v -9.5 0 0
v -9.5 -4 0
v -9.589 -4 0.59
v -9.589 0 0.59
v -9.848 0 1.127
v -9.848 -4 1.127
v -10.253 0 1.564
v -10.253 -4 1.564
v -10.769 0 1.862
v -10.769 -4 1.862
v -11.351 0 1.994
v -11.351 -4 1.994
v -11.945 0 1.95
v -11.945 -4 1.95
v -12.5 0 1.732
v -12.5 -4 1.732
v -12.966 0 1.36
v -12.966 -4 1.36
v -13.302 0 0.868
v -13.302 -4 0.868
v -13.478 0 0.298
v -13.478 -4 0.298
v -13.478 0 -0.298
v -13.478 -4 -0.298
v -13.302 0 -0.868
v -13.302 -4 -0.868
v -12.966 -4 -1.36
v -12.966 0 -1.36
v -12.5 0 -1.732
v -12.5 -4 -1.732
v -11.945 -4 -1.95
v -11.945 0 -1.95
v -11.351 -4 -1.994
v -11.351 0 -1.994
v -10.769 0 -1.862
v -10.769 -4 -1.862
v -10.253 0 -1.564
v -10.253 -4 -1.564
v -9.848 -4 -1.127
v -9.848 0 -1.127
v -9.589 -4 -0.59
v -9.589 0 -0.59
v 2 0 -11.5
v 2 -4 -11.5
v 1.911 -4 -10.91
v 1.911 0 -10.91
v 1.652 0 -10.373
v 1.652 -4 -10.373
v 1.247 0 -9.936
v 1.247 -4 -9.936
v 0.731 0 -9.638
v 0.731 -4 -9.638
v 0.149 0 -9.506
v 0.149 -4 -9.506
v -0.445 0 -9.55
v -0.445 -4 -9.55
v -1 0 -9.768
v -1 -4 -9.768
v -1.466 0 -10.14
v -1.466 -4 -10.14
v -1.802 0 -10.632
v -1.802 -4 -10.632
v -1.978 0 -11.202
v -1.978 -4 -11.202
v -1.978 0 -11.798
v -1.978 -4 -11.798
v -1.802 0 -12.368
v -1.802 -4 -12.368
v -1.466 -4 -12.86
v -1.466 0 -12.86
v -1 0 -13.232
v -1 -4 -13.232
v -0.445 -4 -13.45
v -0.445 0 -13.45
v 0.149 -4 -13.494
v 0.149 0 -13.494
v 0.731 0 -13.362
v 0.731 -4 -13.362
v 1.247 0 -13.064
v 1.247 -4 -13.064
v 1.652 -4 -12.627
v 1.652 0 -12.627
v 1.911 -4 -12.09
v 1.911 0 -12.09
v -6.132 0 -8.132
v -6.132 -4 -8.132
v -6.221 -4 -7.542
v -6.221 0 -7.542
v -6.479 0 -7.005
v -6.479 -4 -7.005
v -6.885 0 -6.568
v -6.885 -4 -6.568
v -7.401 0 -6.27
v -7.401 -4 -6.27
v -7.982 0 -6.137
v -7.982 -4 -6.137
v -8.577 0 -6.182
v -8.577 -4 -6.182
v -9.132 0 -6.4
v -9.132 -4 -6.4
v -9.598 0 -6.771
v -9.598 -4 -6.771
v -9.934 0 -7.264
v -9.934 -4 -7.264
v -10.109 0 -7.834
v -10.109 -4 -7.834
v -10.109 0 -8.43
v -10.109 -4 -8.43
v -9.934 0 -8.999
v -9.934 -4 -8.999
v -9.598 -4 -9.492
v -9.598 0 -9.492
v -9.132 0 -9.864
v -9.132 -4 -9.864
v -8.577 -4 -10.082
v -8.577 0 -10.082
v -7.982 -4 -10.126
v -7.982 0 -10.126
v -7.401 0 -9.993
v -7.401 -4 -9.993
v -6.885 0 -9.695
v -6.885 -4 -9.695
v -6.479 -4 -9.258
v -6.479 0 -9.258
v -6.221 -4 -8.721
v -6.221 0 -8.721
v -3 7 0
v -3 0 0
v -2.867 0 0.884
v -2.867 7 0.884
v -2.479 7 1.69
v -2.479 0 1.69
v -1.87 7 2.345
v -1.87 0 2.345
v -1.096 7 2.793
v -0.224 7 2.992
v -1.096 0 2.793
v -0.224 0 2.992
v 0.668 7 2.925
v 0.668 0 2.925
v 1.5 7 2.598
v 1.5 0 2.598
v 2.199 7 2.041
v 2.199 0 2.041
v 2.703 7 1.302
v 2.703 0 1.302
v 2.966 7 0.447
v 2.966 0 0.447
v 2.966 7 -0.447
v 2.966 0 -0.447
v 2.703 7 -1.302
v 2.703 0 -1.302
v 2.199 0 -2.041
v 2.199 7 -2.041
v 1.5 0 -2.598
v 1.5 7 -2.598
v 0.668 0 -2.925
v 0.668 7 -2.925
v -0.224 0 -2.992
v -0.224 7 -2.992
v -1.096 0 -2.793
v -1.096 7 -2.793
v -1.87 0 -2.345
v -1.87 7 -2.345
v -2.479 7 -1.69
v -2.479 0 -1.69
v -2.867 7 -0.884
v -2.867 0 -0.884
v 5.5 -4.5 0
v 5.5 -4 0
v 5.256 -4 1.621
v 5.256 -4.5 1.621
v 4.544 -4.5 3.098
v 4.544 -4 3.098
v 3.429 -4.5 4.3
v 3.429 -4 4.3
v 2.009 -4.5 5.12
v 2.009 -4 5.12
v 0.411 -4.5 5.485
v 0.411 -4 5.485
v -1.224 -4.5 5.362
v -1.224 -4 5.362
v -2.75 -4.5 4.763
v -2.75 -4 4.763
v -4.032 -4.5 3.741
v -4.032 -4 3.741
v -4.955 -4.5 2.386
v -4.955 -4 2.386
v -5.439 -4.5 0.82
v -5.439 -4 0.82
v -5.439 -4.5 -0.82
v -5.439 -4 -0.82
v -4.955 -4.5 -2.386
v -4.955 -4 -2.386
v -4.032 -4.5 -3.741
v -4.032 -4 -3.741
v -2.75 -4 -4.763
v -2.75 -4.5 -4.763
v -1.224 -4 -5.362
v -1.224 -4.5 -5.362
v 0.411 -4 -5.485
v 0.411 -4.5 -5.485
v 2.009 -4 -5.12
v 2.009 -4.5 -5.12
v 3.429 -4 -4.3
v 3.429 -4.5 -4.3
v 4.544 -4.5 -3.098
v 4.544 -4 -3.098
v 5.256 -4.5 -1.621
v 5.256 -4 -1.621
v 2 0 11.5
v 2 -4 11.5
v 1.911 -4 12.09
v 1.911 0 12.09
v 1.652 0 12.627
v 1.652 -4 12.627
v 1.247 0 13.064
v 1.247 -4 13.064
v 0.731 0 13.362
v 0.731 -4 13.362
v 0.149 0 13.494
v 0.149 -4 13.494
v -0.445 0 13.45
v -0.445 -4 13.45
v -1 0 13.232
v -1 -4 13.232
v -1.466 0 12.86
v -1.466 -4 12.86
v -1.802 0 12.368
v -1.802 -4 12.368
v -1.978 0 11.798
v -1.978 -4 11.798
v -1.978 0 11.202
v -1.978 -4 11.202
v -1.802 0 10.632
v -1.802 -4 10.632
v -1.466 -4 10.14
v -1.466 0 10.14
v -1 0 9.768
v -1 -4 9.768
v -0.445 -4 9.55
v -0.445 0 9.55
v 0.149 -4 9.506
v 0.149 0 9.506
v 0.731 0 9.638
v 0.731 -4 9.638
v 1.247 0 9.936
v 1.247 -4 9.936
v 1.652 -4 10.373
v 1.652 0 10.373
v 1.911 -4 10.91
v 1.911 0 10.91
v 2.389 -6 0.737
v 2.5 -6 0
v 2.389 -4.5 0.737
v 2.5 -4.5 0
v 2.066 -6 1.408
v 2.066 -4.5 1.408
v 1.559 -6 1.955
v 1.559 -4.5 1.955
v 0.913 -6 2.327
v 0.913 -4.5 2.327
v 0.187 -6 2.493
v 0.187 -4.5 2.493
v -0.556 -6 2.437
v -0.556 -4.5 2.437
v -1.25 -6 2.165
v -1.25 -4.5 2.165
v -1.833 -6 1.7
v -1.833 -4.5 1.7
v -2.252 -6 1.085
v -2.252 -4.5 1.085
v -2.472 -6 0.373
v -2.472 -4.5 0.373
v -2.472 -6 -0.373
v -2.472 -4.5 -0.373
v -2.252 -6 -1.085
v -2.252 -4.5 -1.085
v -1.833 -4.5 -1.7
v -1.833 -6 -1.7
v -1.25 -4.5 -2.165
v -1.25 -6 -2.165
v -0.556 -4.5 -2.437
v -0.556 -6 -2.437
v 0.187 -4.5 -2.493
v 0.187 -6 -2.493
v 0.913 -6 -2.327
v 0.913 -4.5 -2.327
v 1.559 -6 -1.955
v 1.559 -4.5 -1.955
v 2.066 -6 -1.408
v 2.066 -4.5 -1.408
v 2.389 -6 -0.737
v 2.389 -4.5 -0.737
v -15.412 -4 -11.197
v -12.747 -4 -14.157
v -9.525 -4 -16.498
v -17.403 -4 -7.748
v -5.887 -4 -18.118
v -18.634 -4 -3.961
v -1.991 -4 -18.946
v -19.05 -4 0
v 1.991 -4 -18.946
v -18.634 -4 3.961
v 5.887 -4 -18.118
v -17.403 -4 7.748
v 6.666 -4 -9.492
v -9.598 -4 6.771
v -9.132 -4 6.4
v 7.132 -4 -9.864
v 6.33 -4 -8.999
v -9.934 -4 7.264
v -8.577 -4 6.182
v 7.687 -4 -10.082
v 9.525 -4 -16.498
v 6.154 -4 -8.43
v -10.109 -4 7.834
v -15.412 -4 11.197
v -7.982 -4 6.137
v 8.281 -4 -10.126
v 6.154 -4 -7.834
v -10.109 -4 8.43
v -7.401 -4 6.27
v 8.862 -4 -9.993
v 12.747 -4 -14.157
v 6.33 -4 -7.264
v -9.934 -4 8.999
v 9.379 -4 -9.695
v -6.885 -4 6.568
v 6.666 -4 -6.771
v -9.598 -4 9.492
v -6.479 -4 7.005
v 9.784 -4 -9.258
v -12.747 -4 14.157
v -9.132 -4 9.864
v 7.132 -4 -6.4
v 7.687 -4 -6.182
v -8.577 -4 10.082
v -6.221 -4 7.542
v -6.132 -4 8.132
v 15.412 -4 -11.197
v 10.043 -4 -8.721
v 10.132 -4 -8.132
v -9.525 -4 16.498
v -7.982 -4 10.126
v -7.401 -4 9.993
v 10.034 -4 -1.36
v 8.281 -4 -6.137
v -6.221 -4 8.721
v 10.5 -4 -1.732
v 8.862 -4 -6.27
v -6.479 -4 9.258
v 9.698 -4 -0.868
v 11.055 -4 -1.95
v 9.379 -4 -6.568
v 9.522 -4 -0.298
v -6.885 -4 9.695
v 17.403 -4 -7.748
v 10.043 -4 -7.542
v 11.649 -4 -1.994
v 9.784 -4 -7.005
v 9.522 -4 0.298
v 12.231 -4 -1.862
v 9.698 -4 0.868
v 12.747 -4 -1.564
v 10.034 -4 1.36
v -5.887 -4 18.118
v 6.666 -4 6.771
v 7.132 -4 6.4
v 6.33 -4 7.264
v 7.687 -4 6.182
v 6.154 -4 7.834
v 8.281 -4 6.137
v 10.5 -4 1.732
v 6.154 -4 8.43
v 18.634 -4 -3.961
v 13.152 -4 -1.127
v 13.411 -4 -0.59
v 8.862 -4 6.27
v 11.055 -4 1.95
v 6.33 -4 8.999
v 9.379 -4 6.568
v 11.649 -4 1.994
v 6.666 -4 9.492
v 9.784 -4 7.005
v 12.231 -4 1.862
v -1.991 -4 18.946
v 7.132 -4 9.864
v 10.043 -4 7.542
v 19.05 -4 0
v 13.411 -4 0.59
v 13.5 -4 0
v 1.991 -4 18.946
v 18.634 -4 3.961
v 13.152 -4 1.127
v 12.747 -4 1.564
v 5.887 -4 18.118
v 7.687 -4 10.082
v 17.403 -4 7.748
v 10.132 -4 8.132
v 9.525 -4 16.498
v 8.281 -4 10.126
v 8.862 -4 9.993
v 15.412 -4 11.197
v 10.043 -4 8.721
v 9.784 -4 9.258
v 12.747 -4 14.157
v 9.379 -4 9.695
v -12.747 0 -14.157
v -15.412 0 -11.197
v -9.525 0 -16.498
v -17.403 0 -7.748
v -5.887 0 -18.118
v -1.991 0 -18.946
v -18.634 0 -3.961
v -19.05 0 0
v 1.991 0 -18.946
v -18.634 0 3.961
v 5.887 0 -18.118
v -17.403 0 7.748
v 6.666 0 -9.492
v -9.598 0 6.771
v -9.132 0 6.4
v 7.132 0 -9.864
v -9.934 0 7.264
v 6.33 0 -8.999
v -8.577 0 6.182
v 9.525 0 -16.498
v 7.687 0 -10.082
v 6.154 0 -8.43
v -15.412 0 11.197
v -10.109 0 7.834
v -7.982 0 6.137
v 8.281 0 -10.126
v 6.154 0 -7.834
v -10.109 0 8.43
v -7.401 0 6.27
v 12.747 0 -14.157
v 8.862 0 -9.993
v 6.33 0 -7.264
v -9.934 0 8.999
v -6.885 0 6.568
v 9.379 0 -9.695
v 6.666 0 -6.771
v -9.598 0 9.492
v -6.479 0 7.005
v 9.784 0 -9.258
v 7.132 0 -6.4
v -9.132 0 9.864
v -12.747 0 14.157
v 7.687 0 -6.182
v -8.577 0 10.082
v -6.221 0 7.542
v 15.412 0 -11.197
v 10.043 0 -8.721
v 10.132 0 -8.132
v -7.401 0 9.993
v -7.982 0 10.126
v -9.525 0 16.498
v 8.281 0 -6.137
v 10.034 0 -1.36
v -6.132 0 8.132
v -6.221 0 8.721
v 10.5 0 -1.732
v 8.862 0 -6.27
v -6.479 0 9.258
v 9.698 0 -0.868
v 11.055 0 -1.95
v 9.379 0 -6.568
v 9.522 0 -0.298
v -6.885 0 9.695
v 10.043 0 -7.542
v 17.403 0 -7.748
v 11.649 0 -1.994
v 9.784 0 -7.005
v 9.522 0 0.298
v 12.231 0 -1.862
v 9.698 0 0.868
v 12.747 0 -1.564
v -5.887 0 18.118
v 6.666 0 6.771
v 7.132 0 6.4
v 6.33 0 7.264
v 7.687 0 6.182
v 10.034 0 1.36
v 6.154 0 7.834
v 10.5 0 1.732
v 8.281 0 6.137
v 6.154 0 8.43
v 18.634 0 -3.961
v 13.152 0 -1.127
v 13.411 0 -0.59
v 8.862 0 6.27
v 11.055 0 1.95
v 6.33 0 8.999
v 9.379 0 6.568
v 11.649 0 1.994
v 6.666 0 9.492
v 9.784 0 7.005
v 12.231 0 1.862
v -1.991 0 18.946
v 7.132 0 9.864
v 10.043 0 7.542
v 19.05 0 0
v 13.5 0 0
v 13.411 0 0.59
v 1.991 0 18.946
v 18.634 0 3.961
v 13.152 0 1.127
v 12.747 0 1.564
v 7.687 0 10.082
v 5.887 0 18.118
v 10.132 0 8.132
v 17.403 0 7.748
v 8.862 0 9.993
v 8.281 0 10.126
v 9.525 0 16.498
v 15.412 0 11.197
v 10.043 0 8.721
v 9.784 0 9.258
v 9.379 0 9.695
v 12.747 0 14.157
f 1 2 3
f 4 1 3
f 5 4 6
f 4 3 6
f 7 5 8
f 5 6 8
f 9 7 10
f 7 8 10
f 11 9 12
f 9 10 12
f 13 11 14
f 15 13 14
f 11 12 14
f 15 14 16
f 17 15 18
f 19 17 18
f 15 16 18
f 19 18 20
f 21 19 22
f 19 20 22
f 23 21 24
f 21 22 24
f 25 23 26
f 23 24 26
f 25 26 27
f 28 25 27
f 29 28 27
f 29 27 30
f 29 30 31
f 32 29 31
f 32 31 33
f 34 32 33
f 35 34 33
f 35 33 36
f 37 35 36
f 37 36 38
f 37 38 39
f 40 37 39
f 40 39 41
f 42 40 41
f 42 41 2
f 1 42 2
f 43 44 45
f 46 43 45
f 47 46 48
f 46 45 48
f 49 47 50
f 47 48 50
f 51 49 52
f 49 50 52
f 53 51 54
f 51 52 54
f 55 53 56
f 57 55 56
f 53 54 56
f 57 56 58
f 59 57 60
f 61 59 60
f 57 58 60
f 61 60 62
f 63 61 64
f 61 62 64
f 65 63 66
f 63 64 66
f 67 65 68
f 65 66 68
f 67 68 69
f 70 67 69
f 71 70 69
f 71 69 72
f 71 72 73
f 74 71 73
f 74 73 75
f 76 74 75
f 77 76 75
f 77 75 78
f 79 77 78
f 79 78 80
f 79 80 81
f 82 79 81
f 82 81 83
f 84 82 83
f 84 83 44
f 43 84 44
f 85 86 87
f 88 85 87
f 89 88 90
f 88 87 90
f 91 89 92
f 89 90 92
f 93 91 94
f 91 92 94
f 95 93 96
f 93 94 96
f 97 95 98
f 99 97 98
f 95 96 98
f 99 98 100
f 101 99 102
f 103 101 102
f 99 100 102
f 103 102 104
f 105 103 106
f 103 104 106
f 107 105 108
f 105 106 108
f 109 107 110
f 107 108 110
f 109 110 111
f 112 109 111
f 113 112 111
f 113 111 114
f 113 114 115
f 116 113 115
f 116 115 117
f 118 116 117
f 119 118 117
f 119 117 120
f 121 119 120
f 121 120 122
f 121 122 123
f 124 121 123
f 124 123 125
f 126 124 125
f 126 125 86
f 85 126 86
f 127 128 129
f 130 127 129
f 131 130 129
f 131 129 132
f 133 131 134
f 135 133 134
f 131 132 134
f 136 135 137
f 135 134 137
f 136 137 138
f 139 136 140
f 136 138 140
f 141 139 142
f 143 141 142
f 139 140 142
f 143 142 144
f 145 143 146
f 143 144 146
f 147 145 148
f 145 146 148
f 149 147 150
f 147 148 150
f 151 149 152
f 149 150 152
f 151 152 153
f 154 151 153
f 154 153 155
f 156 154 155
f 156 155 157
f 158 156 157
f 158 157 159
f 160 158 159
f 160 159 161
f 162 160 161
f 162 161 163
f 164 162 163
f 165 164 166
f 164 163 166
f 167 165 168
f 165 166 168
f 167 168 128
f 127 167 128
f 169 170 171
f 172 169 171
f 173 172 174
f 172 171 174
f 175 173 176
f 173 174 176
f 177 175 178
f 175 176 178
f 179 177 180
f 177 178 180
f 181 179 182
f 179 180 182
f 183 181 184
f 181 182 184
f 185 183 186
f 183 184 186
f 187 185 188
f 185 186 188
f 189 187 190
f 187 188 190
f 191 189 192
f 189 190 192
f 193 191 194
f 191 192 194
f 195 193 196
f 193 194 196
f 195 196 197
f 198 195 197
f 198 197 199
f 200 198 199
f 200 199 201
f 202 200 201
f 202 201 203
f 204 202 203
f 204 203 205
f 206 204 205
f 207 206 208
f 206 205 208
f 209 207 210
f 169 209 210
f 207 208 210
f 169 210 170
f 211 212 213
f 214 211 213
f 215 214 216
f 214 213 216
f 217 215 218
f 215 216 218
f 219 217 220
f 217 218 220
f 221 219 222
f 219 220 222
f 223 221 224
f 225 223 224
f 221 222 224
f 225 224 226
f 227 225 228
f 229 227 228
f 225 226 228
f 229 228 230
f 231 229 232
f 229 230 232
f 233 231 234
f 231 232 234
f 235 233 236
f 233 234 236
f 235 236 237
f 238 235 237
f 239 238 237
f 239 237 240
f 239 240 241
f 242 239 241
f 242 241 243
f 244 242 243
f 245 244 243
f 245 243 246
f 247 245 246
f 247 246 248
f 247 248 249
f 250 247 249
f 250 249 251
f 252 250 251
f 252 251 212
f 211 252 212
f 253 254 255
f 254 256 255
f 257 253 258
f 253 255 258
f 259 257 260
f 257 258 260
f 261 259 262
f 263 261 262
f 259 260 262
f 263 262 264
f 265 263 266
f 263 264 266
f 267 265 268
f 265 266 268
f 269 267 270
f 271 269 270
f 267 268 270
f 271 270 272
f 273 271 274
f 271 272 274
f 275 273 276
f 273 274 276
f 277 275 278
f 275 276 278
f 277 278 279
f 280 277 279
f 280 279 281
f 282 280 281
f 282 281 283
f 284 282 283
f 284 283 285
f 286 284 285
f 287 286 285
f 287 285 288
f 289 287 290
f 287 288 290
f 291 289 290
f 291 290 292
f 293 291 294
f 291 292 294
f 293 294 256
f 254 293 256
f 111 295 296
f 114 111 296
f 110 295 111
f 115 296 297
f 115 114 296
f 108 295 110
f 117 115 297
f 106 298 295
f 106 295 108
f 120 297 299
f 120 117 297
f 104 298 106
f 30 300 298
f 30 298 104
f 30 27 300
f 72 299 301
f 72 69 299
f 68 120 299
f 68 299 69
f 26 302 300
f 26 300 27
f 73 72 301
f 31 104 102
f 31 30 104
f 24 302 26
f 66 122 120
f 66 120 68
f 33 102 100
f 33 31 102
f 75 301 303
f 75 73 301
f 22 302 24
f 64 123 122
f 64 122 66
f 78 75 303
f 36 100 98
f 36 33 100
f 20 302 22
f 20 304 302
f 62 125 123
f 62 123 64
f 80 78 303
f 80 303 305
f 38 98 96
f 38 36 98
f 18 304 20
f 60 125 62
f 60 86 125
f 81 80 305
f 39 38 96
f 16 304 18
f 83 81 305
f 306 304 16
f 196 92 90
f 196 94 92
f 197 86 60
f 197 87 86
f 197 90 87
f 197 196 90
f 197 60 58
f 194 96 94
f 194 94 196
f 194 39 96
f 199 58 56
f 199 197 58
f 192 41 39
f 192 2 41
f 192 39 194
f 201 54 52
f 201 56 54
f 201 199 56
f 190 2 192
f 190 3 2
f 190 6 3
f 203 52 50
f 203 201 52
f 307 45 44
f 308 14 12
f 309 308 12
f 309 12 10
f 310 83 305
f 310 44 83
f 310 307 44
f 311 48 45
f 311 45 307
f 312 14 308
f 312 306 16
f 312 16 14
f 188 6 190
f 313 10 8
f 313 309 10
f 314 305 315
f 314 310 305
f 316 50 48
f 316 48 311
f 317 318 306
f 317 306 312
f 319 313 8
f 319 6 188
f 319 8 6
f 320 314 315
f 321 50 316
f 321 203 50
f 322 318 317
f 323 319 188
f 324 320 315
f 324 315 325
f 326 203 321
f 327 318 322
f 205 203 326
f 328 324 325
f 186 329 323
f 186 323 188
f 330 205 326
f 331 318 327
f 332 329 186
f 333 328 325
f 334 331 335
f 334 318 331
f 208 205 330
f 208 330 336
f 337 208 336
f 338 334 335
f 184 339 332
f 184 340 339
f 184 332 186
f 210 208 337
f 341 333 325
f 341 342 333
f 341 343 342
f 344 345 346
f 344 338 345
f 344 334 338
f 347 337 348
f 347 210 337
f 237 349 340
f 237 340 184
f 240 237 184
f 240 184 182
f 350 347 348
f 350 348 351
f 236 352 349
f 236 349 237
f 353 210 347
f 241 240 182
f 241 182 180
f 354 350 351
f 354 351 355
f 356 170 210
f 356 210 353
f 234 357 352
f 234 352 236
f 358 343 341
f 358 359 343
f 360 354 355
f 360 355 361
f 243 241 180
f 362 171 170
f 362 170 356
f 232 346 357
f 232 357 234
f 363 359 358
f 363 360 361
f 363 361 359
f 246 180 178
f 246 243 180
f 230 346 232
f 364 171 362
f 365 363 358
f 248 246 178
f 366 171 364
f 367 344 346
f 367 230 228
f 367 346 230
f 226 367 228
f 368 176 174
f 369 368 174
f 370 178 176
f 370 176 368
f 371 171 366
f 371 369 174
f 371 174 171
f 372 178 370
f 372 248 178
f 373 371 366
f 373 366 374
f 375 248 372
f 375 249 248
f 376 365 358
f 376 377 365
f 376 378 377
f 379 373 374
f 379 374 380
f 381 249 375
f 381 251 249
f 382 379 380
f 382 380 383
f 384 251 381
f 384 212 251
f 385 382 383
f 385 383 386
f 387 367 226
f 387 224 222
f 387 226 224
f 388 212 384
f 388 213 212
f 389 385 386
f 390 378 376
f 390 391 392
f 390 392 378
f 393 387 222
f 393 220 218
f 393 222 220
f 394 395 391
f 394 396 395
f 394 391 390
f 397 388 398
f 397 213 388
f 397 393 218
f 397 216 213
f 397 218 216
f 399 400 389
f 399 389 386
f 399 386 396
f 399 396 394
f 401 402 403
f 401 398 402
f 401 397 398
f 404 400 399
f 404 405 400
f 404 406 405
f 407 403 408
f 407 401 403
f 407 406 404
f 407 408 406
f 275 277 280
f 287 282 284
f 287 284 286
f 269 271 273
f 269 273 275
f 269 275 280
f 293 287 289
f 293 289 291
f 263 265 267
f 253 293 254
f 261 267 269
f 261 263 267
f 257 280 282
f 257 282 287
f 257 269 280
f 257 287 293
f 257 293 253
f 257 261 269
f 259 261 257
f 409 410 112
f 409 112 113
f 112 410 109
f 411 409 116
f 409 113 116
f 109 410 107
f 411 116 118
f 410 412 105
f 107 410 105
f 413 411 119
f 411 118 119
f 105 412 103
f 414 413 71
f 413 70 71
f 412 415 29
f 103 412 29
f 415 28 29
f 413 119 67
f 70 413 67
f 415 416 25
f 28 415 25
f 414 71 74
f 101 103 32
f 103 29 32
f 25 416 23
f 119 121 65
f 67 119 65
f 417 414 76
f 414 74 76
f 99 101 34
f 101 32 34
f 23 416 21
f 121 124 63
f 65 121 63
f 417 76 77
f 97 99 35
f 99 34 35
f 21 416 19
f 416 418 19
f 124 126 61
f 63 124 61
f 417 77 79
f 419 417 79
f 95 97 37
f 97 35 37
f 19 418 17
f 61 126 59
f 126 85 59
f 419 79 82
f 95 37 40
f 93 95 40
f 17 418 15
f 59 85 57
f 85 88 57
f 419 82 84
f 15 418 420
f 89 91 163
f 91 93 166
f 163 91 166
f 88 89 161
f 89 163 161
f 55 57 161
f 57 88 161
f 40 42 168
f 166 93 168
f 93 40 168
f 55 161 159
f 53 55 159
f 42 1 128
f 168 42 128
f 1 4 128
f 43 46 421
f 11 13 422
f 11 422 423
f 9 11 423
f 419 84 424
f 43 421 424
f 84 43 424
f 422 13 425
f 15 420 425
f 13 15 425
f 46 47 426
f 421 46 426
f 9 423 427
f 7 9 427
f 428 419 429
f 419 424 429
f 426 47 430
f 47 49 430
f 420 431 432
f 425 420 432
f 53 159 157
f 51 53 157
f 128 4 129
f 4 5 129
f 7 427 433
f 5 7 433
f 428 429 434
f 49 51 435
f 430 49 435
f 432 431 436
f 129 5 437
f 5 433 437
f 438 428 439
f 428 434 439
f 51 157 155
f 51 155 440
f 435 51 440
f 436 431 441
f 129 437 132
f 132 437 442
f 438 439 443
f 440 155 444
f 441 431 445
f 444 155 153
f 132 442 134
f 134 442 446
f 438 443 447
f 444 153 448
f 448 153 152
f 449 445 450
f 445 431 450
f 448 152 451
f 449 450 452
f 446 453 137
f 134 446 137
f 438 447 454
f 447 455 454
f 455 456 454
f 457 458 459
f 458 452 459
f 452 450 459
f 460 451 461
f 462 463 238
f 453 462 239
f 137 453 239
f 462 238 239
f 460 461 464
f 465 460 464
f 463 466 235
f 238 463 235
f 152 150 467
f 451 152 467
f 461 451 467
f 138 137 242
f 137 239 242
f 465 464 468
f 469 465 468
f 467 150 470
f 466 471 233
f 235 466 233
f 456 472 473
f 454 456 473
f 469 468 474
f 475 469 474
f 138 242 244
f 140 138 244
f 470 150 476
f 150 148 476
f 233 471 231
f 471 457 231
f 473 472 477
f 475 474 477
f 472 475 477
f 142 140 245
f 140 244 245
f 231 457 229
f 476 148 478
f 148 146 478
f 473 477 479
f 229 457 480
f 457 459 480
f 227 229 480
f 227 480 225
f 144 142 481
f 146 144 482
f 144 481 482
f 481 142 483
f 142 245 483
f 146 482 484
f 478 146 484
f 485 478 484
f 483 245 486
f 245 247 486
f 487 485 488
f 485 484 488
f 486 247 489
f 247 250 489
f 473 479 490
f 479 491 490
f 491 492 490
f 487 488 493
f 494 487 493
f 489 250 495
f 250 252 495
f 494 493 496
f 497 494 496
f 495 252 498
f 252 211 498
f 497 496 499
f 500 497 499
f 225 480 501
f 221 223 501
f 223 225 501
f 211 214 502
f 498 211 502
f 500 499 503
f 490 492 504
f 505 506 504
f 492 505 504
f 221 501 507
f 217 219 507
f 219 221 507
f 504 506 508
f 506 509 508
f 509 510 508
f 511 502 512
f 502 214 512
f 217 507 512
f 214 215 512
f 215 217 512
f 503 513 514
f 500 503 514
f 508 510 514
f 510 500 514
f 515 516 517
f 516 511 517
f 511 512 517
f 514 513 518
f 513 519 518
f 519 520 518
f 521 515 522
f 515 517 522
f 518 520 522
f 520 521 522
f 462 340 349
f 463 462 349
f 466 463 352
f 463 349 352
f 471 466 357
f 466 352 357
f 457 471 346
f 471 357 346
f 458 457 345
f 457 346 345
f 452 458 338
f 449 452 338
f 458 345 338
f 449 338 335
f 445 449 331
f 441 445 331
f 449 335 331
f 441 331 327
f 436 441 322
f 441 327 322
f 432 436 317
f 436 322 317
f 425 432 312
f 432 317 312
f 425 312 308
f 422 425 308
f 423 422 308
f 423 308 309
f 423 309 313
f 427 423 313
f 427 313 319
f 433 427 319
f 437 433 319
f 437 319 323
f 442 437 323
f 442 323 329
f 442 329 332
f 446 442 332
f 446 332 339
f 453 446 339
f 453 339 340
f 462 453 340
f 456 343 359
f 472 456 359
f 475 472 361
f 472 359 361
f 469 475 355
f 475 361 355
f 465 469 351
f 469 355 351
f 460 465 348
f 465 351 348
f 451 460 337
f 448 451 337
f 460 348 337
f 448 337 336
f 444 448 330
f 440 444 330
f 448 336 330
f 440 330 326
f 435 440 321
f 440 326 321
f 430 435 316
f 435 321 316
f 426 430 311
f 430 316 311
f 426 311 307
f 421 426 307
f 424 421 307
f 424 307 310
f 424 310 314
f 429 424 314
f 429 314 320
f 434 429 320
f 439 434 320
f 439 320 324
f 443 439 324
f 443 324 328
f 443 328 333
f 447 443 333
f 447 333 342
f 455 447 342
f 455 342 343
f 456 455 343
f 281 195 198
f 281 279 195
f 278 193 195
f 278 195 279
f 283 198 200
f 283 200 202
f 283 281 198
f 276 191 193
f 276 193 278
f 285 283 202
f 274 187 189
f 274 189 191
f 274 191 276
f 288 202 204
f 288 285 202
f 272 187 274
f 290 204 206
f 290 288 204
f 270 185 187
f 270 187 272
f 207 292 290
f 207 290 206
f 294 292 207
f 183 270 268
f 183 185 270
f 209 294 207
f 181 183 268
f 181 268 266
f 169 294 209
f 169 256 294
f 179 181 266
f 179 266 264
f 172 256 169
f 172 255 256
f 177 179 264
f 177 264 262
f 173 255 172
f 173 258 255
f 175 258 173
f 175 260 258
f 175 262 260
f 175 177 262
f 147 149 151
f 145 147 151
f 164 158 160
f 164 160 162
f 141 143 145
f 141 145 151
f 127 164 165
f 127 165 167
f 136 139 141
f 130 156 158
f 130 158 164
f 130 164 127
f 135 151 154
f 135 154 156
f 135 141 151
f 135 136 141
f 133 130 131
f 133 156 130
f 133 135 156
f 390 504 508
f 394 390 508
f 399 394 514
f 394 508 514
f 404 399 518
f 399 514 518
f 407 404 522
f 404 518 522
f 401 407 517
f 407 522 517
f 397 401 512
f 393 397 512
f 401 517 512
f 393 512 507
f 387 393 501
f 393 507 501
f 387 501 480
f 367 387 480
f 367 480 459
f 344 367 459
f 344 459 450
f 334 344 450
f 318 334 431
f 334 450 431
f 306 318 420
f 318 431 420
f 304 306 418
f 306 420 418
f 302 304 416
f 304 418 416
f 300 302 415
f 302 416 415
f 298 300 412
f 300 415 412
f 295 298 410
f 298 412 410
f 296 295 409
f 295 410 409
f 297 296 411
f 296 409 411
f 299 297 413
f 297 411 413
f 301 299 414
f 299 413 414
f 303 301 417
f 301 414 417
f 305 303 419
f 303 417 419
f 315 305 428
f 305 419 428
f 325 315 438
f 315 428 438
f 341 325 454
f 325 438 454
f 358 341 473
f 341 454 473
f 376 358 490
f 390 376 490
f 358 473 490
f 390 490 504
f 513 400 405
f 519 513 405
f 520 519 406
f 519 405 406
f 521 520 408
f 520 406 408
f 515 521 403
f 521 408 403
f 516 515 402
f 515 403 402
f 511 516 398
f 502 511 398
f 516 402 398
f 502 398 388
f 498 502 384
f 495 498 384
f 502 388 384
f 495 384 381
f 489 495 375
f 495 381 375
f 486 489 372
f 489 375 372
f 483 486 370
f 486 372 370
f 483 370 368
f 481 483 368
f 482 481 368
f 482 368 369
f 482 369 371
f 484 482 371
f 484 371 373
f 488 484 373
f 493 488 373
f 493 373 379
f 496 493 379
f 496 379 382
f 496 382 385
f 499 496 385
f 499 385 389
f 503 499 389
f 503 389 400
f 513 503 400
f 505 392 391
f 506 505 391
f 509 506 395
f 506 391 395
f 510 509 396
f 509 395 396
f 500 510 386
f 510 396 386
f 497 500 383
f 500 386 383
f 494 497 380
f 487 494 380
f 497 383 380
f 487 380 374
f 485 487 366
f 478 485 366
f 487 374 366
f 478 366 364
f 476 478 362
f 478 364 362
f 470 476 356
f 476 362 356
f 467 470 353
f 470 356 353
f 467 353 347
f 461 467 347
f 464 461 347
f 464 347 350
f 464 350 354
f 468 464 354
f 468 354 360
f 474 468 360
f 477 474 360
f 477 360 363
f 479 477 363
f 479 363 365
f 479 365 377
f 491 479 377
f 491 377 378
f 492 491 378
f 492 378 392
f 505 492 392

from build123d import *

# Parameters (mm, degrees)
F0_R     = 19.05
F1_DEPTH = 4
F2_R     = 5.5
F2_R_2   = 2.5
F3_DEPTH = 0.5
F4_DEPTH = 1
F5_DEPTH = 1
F6_R     = 3
F7_DEPTH = 7
F8_R     = 2
F9_DEPTH = 25


with BuildPart() as f1:
    # F0 (on Front) → F1 (new body)
    with BuildSketch(Plane.XZ):
        Circle(F0_R)
    extrude(amount=F1_DEPTH)

    # F2 (on face) → F3 (join)
    with BuildSketch(Plane.XZ.offset(4)):
        Circle(F2_R)
        Circle(F2_R_2, mode=Mode.SUBTRACT)
    extrude(amount=F3_DEPTH)

    # F4 (add): a face of the model
    f4_faces = [f1.faces().sort_by_distance(p)[0] for p in [
        (0, -4, 0),
    ]]
    extrude(f4_faces, amount=F4_DEPTH)

    # F5 (add): a face of the model
    f5_faces = [f1.faces().sort_by_distance(p)[0] for p in [
        (0, -5, 0),
    ]]
    extrude(f5_faces, amount=F5_DEPTH)

    # F6 (on face) → F7 (join)
    with BuildSketch(Plane(origin=(0, 0, 0), x_dir=(-1, 0, 0), z_dir=(0, 1, 0))):
        Circle(F6_R)
    extrude(amount=F7_DEPTH)

    # F8 (on face) → F9 (cut)
    with BuildSketch(Plane.XZ.offset(4)):
        with Locations((0, 11.5)):
            Circle(F8_R)
        with Locations((-8.1317279836, 8.1317279836)):
            Circle(F8_R)
        with Locations((-11.5, 0)):
            Circle(F8_R)
        with Locations((-8.1317279836, -8.1317279836)):
            Circle(F8_R)
        with Locations((0, -11.5)):
            Circle(F8_R)
        with Locations((8.1317279836, -8.1317279836)):
            Circle(F8_R)
        with Locations((11.5, 0)):
            Circle(F8_R)
        with Locations((8.1317279836, 8.1317279836)):
            Circle(F8_R)
    extrude(amount=-F9_DEPTH, mode=Mode.SUBTRACT)


solid = f1.part
